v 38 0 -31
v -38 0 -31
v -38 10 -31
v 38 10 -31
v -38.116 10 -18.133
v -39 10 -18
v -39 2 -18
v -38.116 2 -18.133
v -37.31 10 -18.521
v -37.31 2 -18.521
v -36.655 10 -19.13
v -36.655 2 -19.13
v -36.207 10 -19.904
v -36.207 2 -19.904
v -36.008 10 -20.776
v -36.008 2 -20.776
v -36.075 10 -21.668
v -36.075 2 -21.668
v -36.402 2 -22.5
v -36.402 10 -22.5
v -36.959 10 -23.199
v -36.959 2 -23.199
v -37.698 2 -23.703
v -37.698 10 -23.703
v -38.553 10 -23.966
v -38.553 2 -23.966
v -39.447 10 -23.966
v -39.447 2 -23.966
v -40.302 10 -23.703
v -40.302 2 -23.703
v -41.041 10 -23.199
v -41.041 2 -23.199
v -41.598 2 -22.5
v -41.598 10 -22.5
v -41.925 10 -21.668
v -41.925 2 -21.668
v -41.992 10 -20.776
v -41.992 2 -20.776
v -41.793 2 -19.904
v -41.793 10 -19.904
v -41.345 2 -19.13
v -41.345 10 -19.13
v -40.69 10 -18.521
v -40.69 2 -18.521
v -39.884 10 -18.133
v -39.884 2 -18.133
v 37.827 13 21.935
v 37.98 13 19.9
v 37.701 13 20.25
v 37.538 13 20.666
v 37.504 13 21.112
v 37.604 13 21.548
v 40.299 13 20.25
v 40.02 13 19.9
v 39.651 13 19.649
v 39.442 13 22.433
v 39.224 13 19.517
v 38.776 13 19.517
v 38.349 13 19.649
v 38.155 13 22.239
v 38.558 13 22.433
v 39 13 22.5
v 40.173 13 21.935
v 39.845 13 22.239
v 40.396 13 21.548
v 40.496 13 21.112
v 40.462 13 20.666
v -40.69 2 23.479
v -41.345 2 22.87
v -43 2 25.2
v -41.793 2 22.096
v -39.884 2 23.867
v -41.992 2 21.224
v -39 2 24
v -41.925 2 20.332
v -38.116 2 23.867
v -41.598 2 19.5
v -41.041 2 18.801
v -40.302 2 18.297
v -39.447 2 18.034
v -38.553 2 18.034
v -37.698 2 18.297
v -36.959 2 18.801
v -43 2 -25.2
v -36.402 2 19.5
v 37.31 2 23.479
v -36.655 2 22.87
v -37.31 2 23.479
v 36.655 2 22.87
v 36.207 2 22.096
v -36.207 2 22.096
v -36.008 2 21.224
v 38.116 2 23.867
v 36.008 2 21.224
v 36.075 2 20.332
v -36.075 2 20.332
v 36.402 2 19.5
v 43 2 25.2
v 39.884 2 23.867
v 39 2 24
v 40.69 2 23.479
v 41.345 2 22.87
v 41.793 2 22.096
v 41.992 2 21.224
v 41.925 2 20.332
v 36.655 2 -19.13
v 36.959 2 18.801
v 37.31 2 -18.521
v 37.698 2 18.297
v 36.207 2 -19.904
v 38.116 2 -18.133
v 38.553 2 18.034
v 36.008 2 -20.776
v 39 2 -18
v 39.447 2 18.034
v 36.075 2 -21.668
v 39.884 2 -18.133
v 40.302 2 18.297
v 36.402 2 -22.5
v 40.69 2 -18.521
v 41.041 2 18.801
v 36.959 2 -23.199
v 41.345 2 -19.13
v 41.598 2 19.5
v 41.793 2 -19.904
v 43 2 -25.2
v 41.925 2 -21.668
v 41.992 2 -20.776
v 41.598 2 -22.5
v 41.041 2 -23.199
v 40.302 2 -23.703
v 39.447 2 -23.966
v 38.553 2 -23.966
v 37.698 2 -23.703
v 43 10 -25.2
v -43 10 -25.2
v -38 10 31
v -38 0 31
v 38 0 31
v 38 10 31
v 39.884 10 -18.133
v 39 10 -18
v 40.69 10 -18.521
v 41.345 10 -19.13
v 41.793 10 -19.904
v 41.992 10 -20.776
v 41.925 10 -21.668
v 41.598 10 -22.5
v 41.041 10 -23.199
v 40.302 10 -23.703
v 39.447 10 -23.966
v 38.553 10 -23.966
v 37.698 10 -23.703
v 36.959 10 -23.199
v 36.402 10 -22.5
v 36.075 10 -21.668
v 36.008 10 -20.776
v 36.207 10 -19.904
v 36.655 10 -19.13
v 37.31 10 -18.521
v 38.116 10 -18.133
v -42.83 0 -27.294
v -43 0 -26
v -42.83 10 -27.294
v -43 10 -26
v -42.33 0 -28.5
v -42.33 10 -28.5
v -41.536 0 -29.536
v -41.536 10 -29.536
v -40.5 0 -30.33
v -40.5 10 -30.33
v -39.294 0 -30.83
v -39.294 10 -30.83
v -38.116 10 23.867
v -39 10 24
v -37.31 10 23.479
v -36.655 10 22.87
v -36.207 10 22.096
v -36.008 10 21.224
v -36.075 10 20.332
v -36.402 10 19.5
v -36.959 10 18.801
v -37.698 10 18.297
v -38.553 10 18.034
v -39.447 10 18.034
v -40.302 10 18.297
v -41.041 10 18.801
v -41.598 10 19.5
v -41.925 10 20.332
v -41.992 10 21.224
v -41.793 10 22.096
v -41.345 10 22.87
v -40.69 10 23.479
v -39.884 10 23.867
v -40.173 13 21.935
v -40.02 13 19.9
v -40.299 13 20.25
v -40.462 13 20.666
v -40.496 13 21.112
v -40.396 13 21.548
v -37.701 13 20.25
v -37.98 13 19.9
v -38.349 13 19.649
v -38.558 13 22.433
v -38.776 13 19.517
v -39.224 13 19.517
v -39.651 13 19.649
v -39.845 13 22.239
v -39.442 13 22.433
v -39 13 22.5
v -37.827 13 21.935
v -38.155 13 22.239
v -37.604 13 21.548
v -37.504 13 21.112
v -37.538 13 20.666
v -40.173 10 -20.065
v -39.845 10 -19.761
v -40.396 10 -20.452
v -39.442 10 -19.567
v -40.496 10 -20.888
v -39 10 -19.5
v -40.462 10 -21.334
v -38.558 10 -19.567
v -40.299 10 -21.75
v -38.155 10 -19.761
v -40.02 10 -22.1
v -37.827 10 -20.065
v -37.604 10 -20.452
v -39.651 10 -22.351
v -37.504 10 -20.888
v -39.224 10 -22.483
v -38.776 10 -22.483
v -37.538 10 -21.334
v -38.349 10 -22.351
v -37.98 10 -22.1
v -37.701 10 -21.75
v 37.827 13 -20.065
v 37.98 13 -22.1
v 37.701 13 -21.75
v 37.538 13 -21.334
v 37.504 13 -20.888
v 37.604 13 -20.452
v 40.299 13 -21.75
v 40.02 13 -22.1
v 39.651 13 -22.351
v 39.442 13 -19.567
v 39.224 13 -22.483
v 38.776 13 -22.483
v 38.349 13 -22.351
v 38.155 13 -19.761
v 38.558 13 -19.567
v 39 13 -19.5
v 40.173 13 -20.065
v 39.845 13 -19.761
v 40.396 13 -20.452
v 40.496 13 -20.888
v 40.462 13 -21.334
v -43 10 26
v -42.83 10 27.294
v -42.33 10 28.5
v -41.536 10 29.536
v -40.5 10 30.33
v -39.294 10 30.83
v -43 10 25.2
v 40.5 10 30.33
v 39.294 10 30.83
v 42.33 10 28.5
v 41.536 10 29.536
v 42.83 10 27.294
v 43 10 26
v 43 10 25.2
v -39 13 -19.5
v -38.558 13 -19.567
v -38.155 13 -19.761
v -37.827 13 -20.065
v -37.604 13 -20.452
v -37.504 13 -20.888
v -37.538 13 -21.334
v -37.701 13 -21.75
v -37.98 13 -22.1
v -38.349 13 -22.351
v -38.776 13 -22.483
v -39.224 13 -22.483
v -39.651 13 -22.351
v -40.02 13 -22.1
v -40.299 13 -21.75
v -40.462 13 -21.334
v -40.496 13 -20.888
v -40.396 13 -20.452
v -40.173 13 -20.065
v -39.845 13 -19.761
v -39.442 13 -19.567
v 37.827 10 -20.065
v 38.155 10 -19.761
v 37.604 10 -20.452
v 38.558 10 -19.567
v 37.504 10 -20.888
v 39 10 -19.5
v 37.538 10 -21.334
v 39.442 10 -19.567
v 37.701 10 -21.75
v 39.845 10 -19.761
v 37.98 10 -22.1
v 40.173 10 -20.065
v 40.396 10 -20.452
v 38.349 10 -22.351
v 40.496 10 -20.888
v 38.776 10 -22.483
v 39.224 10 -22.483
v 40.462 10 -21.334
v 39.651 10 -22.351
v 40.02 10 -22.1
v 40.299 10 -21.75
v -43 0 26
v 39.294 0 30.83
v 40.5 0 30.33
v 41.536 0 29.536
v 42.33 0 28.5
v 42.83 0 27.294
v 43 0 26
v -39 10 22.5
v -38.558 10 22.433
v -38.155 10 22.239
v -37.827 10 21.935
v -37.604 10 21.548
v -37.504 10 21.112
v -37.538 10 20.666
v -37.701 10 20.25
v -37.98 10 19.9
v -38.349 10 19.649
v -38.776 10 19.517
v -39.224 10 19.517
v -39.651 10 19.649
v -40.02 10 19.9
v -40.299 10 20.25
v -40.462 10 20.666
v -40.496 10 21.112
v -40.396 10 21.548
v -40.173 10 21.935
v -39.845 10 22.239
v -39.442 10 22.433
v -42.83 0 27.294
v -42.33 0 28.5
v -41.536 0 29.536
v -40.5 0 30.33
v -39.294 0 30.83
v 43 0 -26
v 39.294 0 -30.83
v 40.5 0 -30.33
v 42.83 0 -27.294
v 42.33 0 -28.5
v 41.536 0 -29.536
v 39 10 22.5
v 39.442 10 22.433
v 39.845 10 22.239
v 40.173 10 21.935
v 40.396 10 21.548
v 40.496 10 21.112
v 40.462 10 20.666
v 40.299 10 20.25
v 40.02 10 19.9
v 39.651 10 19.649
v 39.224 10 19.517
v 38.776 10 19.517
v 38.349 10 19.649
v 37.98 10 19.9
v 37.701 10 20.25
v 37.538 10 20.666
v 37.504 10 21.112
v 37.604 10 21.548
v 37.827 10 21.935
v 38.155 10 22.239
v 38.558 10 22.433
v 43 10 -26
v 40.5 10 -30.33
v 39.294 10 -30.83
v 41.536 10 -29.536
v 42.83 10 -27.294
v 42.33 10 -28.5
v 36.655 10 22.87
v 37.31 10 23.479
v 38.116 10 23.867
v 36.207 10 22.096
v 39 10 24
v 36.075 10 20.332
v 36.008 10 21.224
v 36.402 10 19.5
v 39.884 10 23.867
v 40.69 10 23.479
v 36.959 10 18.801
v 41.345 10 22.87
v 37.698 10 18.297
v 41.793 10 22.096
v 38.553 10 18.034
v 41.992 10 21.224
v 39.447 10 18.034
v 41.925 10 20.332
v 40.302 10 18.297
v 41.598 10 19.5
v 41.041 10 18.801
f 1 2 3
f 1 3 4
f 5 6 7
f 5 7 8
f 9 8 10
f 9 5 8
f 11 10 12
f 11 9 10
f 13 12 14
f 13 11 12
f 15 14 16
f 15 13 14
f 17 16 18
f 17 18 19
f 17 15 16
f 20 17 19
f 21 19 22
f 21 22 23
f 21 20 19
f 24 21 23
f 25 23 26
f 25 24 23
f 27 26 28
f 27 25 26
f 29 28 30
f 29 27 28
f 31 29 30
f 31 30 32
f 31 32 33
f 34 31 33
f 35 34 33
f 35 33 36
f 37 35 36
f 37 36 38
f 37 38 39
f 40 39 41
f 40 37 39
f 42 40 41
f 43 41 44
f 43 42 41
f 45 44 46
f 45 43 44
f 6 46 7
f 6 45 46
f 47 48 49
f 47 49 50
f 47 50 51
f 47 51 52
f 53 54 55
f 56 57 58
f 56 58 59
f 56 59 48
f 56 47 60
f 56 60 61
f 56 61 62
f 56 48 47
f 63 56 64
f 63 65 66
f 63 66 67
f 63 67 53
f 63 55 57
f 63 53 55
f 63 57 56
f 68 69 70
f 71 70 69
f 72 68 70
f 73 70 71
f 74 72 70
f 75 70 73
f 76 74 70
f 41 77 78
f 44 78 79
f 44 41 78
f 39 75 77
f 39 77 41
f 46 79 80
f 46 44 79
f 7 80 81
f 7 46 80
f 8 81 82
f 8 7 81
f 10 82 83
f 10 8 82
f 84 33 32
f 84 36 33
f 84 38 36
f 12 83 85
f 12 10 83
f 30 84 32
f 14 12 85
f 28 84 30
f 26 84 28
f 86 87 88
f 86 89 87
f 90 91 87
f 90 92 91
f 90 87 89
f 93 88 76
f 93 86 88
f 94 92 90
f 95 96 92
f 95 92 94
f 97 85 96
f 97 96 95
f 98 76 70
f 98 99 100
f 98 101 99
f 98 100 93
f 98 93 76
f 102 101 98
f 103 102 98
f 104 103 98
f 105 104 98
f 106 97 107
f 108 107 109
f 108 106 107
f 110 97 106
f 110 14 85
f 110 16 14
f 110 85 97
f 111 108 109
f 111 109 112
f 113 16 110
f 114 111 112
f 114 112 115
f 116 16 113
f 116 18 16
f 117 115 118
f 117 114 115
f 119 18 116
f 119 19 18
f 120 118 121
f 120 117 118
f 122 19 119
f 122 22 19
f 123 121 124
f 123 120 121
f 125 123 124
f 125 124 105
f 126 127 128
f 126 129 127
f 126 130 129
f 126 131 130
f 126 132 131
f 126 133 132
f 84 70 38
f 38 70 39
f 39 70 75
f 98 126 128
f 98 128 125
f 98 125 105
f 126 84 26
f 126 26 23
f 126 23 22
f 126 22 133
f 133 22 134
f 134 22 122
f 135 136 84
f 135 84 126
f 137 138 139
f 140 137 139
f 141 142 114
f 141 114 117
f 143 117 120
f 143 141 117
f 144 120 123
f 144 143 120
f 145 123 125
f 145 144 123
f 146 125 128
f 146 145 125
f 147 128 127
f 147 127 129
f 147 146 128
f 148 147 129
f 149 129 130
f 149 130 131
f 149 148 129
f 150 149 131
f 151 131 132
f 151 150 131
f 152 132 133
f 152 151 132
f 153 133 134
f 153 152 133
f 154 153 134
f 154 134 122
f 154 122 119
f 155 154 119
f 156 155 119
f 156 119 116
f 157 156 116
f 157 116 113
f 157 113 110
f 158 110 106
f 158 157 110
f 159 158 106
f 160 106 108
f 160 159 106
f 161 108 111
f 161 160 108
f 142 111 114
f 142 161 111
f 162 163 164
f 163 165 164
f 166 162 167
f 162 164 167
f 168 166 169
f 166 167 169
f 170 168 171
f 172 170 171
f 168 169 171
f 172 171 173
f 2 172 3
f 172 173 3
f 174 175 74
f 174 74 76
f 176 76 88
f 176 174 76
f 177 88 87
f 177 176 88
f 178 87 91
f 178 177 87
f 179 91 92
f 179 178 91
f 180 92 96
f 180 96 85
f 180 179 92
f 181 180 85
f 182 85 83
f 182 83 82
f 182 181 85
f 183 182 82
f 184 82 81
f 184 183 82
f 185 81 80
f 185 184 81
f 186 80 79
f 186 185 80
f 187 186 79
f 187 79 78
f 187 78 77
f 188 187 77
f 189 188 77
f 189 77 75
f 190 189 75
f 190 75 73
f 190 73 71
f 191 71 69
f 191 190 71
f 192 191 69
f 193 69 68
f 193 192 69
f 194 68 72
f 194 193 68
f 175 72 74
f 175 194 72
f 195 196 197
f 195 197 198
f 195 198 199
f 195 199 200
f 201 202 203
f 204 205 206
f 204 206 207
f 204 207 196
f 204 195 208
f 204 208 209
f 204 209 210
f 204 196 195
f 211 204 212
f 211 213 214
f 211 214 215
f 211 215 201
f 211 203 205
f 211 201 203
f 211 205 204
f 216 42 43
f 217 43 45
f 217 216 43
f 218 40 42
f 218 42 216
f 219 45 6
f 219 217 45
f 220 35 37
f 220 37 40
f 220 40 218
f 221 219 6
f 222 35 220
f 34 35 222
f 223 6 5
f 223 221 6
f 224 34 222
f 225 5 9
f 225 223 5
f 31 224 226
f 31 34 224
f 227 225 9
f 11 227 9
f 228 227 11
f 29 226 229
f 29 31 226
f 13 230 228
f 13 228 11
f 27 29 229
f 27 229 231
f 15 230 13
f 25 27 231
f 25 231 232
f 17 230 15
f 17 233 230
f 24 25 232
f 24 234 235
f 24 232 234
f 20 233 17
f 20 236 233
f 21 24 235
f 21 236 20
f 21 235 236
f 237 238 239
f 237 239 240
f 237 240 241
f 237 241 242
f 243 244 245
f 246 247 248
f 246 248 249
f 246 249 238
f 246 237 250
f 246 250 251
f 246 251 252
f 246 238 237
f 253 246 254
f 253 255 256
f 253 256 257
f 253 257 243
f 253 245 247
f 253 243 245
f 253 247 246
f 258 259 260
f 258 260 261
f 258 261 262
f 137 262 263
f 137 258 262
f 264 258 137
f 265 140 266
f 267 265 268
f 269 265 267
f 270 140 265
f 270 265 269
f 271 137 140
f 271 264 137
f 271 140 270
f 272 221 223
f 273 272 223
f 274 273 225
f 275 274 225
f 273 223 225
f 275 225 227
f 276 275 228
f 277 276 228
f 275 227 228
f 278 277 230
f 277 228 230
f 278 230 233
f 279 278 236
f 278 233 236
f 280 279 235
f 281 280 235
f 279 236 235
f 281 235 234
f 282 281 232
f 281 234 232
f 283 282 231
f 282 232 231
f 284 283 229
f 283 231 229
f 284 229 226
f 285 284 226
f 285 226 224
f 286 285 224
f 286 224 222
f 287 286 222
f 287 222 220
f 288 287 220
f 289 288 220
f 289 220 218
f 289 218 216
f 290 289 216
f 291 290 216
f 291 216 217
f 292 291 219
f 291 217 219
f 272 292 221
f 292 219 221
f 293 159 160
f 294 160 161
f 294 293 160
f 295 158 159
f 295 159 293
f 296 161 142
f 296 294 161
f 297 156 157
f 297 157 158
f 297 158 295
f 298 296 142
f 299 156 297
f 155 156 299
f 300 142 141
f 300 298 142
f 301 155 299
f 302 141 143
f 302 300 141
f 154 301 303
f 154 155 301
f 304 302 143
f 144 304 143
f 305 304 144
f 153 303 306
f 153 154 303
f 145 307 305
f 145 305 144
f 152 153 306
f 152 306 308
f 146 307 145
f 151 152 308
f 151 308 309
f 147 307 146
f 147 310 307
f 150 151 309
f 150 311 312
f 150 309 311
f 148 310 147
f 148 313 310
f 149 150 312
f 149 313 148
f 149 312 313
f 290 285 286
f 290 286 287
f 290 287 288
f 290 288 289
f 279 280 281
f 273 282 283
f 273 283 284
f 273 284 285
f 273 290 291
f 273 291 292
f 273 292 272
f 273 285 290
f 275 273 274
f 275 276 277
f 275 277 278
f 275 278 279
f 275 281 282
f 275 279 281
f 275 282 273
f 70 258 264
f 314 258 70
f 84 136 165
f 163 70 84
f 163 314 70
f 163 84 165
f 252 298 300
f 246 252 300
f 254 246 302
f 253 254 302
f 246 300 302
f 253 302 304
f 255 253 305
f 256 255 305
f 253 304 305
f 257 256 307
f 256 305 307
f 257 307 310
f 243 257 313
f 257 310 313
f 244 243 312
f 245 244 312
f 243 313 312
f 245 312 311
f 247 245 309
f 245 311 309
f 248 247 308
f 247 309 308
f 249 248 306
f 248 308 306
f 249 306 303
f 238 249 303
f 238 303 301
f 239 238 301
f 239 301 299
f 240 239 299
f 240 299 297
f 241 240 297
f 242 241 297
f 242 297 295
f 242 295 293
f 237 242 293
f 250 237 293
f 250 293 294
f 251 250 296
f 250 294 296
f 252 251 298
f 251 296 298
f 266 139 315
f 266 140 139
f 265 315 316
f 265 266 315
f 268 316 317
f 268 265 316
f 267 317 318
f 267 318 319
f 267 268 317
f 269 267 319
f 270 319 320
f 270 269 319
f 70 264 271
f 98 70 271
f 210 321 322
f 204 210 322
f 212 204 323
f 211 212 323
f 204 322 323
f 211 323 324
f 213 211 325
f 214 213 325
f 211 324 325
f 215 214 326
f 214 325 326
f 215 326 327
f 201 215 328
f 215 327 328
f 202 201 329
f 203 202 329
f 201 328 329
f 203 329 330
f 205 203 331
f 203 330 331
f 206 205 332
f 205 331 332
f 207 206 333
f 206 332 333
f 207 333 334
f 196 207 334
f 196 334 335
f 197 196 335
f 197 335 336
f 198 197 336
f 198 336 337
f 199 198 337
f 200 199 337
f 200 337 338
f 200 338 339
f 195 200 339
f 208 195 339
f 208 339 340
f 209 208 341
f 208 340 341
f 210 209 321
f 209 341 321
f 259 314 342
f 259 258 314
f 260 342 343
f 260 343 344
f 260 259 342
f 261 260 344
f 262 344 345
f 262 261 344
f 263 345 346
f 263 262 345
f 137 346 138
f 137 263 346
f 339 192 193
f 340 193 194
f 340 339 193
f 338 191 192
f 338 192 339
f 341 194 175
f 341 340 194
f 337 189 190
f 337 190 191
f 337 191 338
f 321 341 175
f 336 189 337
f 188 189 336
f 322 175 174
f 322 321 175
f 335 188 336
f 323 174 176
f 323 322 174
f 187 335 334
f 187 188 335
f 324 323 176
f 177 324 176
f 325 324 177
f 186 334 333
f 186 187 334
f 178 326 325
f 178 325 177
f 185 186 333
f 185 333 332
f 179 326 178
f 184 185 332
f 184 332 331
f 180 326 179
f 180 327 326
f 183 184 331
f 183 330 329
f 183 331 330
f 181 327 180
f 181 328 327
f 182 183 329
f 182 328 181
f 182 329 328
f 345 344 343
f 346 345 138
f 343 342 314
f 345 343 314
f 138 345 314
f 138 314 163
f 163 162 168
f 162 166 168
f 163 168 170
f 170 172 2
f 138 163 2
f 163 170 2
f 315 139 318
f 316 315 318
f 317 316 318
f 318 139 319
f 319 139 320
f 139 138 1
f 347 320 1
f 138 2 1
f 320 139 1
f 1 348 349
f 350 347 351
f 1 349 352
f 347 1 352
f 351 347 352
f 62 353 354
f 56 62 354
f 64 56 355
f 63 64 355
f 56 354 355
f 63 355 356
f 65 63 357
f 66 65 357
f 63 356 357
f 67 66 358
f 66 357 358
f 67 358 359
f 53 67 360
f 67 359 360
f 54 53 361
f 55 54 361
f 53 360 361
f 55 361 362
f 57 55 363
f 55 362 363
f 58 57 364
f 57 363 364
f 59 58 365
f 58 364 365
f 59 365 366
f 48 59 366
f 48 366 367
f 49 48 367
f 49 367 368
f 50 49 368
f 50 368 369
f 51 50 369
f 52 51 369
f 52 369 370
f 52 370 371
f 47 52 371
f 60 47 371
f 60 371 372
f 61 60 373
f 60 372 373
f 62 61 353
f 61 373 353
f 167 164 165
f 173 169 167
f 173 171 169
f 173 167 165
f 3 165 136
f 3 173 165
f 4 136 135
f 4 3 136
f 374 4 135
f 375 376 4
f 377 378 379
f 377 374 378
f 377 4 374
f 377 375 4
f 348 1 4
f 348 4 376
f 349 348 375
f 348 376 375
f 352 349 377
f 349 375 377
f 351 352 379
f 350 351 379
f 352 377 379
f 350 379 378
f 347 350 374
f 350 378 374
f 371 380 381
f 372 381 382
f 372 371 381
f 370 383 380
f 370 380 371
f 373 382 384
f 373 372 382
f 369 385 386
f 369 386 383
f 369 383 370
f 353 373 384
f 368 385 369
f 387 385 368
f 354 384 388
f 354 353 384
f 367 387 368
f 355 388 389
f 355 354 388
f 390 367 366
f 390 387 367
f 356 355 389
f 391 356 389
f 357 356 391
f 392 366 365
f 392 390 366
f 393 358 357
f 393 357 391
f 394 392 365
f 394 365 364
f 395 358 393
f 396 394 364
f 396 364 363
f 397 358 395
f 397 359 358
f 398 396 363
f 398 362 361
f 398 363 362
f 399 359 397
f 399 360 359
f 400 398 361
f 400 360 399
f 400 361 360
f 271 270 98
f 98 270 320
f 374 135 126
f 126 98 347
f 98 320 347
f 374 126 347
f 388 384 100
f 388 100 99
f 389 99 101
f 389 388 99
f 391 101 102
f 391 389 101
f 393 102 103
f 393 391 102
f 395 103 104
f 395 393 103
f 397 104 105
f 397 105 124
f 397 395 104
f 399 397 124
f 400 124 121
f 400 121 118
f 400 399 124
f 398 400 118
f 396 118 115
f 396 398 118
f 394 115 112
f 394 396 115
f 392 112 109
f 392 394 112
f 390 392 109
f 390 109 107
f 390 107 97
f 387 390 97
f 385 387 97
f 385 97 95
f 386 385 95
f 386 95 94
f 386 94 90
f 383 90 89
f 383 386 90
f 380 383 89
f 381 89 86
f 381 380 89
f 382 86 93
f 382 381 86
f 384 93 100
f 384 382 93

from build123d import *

# Parameters (mm, degrees)
SKETCH_1_W          = 86
SKETCH_1_H          = 62
EXTRUDE_1_DEPTH     = 10
SKETCH_2_W          = 86
SKETCH_2_H          = 50.4
SKETCH_2_R          = 3
CUT_EXTRUDE_1_DEPTH = 8
SKETCH_3_R          = 1.5
EXTRUDE_2_DEPTH     = 3
FILLET_1_R          = 5


with BuildPart() as part:
    # 草图1 → 凸台-拉伸1 (new body)
    with BuildSketch(Plane(origin=(0, 0, 0), x_dir=(1, 0, 0), z_dir=(0, 1, 0))):
        Rectangle(SKETCH_1_W, SKETCH_1_H)
    extrude(amount=EXTRUDE_1_DEPTH)

    # 草图2 → 切除-拉伸1 (cut)
    with BuildSketch(Plane(origin=(0, 10, 0), x_dir=(1, 0, 0), z_dir=(0, 1, 0))):
        Rectangle(SKETCH_2_W, SKETCH_2_H)
        with Locations(Location((-39, 21, 0), (0, 0, 270))):
            Circle(SKETCH_2_R, mode=Mode.SUBTRACT)
        with Locations(Location((39, 21, 0), (0, 0, 270))):
            Circle(SKETCH_2_R, mode=Mode.SUBTRACT)
        with Locations(Location((39, -21, 0), (0, 0, 270))):
            Circle(SKETCH_2_R, mode=Mode.SUBTRACT)
        with Locations(Location((-39, -21, 0), (0, 0, 270))):
            Circle(SKETCH_2_R, mode=Mode.SUBTRACT)
    extrude(amount=-CUT_EXTRUDE_1_DEPTH, mode=Mode.SUBTRACT)

    # 草图3 → 凸台-拉伸2 (add)
    with BuildSketch(Plane(origin=(0, 10, 0), x_dir=(1, 0, 0), z_dir=(0, 1, 0))):
        with Locations(Location((-39, 21, 0), (0, 0, 270))):
            Circle(SKETCH_3_R)
        with Locations(Location((39, 21, 0), (0, 0, 270))):
            Circle(SKETCH_3_R)
        with Locations(Location((39, -21, 0), (0, 0, 270))):
            Circle(SKETCH_3_R)
        with Locations(Location((-39, -21, 0), (0, 0, 270))):
            Circle(SKETCH_3_R)
    extrude(amount=EXTRUDE_2_DEPTH)

    # 圆角1
    fillet_1_edges = [part.edges().sort_by_distance(p)[0] for p in [
        (-43, 5, -31),
        (43, 5, -31),
        (43, 5, 31),
        (-43, 5, 31),
    ]]
    fillet(fillet_1_edges, radius=FILLET_1_R)


solid = part.part
